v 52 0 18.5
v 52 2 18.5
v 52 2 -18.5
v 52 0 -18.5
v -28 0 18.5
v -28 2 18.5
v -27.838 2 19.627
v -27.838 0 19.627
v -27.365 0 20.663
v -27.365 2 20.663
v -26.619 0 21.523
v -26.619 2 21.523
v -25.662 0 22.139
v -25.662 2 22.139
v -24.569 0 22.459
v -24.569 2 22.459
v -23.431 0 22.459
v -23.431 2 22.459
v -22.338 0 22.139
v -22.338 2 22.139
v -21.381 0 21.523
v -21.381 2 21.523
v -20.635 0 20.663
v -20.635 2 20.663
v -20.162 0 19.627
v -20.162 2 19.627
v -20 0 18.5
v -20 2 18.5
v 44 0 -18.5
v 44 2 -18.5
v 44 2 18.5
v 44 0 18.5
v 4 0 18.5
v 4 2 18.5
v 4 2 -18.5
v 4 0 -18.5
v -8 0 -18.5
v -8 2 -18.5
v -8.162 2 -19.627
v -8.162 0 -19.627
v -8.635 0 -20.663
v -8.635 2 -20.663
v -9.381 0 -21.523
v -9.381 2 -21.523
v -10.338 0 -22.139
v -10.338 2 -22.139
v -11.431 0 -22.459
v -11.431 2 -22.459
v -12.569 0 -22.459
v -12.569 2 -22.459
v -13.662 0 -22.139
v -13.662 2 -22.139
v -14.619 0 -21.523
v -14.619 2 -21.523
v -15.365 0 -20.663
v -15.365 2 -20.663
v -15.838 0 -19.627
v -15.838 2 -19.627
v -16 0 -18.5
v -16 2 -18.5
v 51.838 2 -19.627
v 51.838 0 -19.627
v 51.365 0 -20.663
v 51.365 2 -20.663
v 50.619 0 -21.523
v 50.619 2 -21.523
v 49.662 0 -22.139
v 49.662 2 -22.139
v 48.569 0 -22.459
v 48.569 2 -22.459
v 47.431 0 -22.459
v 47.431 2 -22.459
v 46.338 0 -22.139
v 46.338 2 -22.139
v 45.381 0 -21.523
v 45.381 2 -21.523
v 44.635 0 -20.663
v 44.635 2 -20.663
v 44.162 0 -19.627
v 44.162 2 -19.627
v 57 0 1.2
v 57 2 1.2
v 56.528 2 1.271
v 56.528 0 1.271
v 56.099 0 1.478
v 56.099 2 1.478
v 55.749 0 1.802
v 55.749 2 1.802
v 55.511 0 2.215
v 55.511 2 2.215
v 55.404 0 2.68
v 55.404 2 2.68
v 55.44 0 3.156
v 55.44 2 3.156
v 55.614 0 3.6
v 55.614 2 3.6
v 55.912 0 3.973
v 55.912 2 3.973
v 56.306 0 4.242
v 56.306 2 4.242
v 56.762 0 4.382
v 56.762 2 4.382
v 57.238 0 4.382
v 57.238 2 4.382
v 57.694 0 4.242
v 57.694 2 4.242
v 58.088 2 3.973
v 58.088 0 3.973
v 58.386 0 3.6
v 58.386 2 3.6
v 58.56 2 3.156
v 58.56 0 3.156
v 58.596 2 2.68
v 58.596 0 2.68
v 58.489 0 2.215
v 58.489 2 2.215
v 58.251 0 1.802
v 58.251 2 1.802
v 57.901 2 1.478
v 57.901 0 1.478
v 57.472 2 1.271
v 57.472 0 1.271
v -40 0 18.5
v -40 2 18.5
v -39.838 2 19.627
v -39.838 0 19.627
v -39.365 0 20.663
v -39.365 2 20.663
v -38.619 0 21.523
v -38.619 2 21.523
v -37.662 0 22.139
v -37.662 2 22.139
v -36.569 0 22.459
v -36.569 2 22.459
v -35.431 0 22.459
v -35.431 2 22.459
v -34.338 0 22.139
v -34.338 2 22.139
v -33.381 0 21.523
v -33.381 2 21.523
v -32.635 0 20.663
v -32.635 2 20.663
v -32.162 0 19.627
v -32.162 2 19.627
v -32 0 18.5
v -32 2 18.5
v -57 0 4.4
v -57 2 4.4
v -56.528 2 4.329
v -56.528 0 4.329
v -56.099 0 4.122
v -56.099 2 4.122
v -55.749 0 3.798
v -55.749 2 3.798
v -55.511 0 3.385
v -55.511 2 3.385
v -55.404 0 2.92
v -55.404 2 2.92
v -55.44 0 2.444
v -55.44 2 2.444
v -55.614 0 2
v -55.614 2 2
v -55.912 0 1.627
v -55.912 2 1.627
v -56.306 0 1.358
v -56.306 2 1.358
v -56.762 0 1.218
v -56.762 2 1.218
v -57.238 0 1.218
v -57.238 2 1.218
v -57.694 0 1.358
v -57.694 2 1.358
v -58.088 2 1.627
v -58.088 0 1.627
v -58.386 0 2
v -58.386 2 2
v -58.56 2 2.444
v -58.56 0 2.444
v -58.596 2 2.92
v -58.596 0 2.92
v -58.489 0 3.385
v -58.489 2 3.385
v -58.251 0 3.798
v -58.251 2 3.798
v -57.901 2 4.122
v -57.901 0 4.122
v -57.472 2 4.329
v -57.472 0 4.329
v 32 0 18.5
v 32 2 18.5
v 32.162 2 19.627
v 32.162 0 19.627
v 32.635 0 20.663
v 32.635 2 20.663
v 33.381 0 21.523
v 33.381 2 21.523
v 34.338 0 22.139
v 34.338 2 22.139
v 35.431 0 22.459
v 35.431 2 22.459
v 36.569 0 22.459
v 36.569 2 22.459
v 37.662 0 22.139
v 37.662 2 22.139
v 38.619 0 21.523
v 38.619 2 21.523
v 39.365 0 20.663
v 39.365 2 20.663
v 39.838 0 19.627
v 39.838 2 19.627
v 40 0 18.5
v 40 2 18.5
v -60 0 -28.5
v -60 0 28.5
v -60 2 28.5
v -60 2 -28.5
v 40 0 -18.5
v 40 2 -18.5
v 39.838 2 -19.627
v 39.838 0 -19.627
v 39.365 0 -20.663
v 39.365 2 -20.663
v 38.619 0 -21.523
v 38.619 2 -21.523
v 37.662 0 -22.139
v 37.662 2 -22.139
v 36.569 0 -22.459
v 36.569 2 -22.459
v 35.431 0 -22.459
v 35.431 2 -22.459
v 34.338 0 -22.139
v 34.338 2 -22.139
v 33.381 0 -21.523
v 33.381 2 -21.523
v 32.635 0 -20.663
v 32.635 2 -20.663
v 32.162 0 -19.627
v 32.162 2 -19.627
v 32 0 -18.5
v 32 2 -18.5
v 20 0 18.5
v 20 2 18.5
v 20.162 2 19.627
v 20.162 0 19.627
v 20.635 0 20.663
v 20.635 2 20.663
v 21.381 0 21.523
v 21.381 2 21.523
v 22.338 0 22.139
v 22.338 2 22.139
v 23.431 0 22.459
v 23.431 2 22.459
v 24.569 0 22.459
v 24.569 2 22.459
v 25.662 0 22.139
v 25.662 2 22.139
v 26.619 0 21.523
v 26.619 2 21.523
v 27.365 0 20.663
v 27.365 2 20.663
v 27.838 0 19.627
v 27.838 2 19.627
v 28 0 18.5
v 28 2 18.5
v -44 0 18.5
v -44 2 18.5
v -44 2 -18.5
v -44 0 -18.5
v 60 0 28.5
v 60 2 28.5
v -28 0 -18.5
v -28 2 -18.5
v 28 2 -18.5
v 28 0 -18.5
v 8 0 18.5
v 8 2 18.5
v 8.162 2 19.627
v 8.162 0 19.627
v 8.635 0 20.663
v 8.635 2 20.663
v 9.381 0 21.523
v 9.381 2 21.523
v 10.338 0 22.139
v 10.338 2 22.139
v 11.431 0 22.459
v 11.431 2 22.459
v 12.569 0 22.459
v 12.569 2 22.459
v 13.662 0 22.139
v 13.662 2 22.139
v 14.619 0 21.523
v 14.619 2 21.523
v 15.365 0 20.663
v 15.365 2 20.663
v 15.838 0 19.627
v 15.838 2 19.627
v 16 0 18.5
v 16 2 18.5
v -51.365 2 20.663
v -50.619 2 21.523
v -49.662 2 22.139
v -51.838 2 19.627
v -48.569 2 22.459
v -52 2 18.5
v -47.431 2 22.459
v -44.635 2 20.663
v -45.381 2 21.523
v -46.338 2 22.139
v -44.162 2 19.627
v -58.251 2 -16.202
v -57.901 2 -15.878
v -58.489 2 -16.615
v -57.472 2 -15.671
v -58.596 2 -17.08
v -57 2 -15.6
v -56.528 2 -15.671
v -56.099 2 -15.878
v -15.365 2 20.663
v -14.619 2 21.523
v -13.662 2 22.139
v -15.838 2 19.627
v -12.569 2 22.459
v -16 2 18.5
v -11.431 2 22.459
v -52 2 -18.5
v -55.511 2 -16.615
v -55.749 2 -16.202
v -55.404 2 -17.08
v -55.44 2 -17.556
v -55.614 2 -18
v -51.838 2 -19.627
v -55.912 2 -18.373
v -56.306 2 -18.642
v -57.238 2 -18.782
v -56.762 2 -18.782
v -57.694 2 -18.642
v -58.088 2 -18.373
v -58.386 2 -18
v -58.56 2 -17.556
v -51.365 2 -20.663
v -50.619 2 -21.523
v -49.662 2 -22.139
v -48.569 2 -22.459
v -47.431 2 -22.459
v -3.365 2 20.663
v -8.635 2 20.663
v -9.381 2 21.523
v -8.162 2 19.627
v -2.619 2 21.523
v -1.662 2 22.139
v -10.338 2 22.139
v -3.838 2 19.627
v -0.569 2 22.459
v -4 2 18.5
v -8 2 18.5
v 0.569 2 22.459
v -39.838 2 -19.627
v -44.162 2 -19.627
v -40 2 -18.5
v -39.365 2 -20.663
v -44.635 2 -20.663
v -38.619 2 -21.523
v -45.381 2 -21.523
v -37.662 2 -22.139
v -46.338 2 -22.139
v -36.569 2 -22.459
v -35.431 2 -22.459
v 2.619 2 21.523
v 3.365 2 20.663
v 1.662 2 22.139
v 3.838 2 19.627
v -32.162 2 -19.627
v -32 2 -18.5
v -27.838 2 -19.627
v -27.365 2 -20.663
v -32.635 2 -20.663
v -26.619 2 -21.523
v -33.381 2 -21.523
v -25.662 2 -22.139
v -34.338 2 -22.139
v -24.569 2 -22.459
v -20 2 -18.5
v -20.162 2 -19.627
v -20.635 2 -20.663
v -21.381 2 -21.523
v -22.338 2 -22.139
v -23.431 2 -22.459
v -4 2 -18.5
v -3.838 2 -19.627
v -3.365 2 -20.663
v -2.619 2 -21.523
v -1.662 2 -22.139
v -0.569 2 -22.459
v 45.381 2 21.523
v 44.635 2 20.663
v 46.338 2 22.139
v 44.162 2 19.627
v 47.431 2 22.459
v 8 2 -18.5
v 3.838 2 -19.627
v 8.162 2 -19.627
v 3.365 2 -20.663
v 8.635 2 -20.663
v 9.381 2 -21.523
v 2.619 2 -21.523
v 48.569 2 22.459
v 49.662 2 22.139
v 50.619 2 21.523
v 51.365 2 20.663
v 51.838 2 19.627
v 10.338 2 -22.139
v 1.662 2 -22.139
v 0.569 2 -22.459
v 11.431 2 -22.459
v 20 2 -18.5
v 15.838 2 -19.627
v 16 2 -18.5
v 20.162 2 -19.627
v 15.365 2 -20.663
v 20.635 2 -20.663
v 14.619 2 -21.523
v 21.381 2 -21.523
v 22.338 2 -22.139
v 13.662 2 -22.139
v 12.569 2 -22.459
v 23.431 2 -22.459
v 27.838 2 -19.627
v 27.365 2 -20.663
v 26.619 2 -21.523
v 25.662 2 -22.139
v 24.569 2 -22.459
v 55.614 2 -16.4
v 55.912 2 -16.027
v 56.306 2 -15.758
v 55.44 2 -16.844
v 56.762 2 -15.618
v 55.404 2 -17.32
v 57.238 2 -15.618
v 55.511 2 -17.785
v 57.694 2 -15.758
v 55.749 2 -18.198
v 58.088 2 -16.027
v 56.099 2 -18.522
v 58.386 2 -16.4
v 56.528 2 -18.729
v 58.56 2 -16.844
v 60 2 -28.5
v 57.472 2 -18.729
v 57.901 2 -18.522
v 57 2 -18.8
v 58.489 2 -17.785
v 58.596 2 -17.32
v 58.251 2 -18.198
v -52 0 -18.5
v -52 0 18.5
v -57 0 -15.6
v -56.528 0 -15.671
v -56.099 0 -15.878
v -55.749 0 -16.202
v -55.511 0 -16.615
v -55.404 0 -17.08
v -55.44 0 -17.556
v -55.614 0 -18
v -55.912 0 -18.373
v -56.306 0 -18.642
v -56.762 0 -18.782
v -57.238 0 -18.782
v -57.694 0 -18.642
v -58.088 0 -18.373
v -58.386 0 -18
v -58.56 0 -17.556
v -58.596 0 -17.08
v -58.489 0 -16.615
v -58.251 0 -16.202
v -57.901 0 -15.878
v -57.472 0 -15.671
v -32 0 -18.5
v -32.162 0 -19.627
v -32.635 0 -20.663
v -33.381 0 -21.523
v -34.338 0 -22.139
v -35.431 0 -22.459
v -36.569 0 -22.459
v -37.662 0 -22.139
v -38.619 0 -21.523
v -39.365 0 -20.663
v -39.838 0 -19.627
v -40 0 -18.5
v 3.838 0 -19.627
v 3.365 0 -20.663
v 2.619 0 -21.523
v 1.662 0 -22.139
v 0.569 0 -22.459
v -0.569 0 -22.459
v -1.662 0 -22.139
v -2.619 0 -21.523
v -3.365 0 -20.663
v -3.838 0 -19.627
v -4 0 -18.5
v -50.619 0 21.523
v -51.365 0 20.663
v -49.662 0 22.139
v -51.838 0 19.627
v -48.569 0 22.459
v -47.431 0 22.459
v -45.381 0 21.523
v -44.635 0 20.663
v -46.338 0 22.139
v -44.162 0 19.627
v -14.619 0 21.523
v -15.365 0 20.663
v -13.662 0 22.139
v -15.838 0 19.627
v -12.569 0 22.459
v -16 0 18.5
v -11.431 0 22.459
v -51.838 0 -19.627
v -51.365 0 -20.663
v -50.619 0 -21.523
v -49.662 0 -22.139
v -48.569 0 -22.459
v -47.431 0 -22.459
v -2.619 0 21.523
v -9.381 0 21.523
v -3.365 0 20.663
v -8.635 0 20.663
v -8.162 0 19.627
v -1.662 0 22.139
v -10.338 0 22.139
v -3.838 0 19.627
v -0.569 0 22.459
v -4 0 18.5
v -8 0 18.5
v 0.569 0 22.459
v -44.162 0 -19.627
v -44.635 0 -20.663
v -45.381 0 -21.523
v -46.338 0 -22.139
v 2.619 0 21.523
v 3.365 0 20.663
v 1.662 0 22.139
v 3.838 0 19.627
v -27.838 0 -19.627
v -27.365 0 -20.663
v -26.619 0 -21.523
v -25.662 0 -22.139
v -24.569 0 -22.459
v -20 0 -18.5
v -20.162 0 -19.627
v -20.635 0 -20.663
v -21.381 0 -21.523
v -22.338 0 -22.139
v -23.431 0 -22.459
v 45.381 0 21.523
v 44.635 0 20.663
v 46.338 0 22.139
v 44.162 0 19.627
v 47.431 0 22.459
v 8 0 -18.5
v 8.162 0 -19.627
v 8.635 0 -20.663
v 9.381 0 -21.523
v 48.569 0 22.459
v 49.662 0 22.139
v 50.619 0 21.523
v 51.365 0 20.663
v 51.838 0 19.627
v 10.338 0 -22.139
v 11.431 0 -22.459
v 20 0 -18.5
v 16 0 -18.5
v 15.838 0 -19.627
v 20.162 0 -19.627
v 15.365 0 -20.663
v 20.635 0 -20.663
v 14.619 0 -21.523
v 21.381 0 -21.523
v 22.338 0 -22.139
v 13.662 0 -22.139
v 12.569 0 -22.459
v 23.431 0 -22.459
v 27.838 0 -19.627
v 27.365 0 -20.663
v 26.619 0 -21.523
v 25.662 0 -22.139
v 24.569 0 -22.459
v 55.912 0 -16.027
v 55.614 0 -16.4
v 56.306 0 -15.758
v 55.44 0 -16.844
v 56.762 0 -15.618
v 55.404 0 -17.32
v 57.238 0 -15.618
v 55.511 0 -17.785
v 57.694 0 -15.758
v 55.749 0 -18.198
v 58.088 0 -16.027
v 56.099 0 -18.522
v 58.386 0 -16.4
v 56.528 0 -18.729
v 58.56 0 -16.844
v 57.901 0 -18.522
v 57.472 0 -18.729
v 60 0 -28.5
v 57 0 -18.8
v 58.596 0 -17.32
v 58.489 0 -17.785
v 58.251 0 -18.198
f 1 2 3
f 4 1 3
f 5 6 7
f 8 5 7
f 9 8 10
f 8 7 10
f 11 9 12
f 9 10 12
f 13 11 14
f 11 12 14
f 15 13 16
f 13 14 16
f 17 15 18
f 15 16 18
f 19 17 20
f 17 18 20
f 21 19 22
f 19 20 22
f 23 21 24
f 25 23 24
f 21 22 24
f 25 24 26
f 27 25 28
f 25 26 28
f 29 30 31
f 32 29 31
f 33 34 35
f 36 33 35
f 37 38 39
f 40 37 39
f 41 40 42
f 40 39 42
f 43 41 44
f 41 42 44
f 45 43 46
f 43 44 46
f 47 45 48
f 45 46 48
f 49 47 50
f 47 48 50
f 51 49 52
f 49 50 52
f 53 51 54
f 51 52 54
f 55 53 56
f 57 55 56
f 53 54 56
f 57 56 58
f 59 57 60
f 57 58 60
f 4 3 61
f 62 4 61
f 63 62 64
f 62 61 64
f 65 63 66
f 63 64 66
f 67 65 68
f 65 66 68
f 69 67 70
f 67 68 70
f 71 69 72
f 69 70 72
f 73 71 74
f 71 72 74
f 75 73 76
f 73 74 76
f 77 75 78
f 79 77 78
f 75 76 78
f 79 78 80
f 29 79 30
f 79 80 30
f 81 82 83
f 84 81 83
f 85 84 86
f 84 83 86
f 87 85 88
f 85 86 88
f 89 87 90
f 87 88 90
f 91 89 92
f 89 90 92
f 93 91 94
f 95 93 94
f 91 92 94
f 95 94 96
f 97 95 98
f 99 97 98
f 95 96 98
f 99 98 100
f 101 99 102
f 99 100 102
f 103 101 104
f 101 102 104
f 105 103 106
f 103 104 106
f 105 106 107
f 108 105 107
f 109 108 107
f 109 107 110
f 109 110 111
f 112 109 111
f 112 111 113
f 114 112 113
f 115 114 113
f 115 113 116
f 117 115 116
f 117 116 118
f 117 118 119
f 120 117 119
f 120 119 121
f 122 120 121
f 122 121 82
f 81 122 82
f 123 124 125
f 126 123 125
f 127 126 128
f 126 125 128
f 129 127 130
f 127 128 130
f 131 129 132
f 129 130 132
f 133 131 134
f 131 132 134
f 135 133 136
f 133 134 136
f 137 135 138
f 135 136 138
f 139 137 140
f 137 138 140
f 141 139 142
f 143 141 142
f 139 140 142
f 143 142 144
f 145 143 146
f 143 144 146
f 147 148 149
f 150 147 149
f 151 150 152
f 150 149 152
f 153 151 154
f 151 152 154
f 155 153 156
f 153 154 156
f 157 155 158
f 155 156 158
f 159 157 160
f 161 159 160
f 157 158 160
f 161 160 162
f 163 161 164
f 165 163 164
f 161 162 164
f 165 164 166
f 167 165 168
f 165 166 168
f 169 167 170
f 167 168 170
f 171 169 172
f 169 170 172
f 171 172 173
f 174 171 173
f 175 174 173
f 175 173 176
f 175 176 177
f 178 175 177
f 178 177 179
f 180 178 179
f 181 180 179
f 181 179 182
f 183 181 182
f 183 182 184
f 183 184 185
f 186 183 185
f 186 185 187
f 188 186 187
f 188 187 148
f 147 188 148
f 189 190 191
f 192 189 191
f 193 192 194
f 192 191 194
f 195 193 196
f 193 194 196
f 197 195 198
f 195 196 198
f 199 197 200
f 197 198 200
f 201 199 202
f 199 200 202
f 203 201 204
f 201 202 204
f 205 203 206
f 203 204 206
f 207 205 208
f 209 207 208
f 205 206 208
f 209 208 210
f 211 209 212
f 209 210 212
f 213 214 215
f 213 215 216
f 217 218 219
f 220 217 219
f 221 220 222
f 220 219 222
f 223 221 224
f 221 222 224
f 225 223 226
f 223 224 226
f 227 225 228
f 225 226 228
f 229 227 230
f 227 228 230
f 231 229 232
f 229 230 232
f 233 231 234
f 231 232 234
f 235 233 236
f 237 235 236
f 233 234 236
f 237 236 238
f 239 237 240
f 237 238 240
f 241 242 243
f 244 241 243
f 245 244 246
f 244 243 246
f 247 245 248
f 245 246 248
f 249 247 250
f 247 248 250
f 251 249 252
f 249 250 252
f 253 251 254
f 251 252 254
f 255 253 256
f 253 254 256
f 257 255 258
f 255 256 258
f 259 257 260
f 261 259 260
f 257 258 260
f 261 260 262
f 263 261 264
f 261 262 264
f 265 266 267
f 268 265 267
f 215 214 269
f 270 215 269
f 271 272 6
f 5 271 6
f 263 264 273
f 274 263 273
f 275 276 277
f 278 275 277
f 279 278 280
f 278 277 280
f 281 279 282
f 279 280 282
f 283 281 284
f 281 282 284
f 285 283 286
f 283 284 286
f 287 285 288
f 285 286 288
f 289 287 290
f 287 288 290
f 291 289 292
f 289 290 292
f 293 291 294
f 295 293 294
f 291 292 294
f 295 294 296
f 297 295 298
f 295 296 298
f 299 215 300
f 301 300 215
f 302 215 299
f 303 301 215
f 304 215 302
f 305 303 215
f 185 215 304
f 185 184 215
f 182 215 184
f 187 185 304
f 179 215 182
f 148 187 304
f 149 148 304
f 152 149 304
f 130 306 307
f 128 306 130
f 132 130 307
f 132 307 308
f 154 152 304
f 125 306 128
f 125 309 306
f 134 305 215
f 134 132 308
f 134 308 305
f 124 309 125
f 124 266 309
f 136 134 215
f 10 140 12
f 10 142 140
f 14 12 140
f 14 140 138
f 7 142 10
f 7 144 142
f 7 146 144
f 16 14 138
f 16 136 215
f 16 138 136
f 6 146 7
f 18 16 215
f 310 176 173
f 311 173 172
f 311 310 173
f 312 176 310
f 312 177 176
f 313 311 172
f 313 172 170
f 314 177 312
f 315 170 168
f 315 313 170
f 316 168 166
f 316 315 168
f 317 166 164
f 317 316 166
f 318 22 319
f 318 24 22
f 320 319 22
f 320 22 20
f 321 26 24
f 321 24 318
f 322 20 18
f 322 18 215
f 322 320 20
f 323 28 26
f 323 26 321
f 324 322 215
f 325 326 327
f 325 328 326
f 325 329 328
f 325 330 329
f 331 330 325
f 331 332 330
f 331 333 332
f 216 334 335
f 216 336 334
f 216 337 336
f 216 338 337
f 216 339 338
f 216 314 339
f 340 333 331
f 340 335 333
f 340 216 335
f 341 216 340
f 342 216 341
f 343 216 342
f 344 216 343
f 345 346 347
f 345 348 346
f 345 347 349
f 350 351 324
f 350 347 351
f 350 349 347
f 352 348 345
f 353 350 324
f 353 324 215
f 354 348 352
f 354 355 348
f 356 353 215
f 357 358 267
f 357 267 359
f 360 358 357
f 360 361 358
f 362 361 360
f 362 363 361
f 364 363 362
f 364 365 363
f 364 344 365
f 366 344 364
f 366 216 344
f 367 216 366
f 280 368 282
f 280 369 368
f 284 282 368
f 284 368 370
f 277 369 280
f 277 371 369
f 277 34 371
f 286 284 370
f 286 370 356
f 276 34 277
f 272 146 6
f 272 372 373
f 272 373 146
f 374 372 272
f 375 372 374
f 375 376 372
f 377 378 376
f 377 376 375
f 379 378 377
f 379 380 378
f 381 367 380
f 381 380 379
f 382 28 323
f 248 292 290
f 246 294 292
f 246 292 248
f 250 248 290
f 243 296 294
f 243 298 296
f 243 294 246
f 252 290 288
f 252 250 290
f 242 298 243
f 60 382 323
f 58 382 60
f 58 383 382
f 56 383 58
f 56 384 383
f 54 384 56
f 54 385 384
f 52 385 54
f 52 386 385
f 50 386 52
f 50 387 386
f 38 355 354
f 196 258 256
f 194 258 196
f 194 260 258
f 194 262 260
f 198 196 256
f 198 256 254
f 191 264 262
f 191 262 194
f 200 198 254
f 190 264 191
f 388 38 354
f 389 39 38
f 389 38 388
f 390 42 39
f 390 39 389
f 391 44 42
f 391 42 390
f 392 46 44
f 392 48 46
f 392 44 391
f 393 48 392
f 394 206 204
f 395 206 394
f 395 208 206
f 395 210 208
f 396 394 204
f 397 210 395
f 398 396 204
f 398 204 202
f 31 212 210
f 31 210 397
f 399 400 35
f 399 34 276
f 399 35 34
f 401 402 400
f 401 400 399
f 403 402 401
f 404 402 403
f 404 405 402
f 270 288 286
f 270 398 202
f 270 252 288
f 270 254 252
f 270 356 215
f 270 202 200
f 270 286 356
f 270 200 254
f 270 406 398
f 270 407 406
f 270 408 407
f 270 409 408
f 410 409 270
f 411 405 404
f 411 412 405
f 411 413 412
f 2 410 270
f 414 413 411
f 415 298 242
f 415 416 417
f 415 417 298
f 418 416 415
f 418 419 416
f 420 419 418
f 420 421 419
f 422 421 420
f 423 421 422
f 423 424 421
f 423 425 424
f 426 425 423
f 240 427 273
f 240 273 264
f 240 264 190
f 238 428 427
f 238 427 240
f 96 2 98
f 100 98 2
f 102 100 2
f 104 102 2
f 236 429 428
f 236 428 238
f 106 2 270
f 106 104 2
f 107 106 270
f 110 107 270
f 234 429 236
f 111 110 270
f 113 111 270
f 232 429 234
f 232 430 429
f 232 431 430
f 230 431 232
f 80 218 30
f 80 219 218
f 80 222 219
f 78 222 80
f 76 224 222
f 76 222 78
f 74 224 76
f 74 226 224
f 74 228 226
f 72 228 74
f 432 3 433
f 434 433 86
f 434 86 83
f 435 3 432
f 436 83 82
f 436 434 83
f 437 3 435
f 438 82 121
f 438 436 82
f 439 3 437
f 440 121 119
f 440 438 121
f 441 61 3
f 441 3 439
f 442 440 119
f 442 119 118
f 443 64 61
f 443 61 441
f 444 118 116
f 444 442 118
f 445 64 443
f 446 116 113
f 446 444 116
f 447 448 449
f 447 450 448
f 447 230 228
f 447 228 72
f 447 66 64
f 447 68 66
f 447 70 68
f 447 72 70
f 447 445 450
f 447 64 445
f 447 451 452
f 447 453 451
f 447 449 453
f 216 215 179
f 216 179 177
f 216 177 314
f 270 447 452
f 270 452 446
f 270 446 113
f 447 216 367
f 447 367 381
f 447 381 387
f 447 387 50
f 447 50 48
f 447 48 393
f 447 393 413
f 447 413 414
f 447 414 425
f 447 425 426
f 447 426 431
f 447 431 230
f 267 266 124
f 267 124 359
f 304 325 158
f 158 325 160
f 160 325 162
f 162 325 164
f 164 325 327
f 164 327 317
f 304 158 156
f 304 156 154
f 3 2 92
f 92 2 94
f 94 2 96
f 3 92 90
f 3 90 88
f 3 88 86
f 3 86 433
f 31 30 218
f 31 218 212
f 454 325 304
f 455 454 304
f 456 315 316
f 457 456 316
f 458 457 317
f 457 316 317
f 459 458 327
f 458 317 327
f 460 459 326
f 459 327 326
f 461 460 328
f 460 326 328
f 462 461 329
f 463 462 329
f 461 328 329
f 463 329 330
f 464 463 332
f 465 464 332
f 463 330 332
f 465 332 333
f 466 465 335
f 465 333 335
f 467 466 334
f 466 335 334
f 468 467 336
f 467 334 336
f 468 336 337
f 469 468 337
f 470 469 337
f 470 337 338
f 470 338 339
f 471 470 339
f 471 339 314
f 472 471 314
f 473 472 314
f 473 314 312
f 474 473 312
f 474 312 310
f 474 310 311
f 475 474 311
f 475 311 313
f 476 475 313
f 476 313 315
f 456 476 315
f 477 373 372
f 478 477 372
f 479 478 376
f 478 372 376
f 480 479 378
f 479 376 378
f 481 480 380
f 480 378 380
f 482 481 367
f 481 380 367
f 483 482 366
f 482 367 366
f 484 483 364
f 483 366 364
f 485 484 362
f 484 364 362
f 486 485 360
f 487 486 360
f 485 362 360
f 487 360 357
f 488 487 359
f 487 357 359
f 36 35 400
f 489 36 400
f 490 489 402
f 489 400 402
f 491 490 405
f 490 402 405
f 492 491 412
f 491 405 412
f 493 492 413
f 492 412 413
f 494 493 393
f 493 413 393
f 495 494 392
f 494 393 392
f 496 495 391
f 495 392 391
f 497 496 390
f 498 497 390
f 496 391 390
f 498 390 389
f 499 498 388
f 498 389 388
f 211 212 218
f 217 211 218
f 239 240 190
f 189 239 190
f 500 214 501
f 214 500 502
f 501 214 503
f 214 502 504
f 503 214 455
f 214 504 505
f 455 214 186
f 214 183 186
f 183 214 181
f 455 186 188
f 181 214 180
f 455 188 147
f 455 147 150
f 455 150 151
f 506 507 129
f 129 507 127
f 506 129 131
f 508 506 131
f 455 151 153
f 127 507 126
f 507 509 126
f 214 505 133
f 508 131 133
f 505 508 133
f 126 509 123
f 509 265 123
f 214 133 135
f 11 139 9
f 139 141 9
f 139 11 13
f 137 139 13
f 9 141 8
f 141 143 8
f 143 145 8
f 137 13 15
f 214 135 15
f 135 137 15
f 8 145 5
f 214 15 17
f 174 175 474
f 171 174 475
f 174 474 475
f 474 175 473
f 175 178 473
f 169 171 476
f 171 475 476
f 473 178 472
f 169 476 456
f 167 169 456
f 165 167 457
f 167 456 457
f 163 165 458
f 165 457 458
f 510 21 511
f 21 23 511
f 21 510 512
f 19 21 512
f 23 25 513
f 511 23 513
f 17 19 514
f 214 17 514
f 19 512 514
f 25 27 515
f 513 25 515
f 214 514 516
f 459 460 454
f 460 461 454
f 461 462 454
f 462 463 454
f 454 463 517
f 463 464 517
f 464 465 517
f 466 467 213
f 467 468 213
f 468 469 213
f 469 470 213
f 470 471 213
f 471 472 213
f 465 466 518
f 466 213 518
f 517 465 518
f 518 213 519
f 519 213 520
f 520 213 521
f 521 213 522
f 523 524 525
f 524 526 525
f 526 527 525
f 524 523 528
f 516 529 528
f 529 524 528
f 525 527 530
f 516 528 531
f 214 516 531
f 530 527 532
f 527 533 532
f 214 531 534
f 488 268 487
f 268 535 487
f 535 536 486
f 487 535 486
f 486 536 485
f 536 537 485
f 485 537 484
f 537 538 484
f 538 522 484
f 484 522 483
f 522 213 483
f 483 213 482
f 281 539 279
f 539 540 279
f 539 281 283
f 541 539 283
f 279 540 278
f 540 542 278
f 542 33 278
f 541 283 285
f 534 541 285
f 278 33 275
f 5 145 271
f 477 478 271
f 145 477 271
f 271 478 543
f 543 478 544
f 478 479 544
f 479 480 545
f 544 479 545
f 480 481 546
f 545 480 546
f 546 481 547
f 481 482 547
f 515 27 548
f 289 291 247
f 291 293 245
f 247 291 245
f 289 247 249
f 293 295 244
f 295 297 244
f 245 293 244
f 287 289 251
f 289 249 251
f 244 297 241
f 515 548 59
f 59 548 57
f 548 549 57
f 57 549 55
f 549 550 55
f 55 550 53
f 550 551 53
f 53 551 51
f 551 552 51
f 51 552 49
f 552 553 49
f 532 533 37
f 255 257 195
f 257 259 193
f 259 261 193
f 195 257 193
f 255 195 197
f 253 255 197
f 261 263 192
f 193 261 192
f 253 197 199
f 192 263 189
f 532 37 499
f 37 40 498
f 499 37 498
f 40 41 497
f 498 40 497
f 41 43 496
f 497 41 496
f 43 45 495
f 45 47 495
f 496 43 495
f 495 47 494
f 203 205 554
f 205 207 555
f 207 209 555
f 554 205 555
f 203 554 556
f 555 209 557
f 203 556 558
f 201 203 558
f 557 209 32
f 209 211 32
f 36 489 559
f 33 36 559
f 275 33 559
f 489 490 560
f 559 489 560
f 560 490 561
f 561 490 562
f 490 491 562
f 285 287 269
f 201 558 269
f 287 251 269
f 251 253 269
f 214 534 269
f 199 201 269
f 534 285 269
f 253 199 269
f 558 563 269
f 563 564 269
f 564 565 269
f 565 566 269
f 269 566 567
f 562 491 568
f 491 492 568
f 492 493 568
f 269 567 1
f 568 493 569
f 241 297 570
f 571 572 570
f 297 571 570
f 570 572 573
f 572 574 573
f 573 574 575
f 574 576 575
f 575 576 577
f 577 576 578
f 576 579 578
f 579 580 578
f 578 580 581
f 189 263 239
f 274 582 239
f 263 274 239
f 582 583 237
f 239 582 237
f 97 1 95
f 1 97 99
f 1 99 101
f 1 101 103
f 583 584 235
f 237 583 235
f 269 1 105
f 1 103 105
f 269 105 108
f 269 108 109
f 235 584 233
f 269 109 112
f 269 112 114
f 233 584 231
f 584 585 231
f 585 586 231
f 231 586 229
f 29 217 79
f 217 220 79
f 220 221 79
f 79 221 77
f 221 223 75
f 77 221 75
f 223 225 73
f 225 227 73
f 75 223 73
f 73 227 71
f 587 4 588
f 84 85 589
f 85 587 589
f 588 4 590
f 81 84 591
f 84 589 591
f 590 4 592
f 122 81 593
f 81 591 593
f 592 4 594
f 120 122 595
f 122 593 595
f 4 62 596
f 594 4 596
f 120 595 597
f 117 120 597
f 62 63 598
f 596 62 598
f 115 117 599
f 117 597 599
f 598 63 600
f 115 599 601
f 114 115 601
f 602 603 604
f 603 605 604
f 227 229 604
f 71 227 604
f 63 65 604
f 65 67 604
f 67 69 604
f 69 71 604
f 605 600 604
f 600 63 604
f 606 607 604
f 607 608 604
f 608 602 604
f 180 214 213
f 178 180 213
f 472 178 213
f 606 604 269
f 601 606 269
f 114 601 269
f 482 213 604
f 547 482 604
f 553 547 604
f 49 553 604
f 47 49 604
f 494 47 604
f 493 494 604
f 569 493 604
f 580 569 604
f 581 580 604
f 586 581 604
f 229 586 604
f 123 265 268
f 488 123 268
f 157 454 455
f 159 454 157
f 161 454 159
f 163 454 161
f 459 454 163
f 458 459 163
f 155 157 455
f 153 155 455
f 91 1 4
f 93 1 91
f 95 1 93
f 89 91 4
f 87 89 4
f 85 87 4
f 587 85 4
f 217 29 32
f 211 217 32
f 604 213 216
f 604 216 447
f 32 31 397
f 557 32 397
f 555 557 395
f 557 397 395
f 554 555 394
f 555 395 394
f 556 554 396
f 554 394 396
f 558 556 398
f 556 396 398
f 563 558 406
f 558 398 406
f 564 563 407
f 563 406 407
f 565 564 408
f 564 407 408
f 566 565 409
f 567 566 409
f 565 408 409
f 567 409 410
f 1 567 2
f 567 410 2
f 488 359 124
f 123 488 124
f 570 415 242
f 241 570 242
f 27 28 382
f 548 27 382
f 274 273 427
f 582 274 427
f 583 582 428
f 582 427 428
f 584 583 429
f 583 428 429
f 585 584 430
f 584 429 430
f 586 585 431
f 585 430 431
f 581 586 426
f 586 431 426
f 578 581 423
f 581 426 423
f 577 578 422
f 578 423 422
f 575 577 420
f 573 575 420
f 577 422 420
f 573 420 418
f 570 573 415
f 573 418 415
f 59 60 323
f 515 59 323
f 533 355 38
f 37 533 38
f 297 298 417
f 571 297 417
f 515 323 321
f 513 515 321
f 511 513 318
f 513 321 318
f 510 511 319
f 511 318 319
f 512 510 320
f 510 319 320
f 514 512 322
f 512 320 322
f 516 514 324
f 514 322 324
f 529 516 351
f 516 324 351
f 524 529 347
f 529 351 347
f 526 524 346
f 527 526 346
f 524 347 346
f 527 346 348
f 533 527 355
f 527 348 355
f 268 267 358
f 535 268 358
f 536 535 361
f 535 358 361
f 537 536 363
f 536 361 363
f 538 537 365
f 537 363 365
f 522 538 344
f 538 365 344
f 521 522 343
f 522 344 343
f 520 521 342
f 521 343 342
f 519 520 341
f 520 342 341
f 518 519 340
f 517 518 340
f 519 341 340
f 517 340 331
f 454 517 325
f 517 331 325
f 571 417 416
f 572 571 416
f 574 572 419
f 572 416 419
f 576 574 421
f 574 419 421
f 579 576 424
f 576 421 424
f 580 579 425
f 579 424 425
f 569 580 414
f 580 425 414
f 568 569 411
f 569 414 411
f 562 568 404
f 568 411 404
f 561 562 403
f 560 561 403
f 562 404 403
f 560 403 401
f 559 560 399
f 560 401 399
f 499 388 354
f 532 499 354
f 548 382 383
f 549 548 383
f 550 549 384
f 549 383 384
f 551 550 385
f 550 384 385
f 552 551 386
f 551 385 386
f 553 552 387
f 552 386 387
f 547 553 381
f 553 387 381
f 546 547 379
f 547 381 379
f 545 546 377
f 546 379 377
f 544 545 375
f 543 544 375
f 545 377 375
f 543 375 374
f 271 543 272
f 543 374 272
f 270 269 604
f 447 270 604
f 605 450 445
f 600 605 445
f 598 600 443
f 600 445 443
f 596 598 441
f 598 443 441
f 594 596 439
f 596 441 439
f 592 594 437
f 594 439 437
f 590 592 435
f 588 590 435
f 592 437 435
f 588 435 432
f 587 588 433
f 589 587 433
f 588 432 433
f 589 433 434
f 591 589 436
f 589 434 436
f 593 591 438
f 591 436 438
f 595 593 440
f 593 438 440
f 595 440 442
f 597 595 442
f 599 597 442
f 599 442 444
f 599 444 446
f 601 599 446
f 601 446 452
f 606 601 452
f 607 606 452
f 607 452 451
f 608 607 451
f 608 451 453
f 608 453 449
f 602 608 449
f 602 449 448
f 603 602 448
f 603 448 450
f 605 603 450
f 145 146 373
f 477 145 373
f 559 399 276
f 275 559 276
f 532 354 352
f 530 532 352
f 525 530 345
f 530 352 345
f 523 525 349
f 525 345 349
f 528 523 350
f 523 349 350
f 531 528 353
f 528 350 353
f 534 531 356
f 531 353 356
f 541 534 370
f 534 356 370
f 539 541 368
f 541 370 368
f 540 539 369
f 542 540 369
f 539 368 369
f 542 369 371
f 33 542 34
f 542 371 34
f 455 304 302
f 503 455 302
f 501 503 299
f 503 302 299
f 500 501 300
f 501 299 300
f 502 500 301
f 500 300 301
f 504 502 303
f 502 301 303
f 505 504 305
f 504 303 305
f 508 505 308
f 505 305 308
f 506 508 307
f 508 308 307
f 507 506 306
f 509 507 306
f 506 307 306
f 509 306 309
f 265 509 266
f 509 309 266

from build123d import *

# Parameters (mm, degrees)
SKETCH_1_W                 = 120
SKETCH_1_H                 = 57
EXTRUDE_1_DEPTH            = 2
SKETCH_2_R                 = 1.6
CUT_EXTRUDE_1_DEPTH        = 67.454871906
CUT_EXTRUDE_2_DEPTH        = 67.454871906
PATTERN_LINEAR_1_COUNT     = 5
PATTERN_LINEAR_1_PITCH     = 12
PATTERN_LINEAR_1_COL_COUNT = 5
PATTERN_LINEAR_1_COL_PITCH = 12


with BuildPart() as part:
    # 草图1 → 凸台-拉伸1 (new body)
    with BuildSketch(Plane(origin=(0, 0, 0), x_dir=(1, 0, 0), z_dir=(0, 1, 0))):
        Rectangle(SKETCH_1_W, SKETCH_1_H)
    extrude(amount=EXTRUDE_1_DEPTH)

    # 草图2 → 切除-拉伸1 (cut, through all)
    with BuildSketch(Plane(origin=(0, 2, 0), x_dir=(1, 0, 0), z_dir=(0, 1, 0))):
        with Locations(Location((-57, 17.2, 0), (0, 0, 270))):
            Circle(SKETCH_2_R)
        with Locations(Location((-57, -2.8, 0), (0, 0, 270))):
            Circle(SKETCH_2_R)
        with Locations(Location((57, -2.8, 0), (0, 0, 90))):
            Circle(SKETCH_2_R)
        with Locations(Location((57, 17.2, 0), (0, 0, 90))):
            Circle(SKETCH_2_R)
    extrude(amount=-CUT_EXTRUDE_1_DEPTH, mode=Mode.SUBTRACT)

    # 草图3 → 切除-拉伸2 (cut, through all)
    with BuildSketch(Plane(origin=(0, 2, 0), x_dir=(1, 0, 0), z_dir=(0, 1, 0))):
        with BuildLine():
            ThreePointArc((-4, -18.5), (0, -14.5), (4, -18.5))
            Line((4, -18.5), (4, 18.5))
            ThreePointArc((4, 18.5), (0, 14.5), (-4, 18.5))
            Line((-4, 18.5), (-4, -18.5))
        make_face()
        with BuildLine():
            ThreePointArc((-4, 18.5), (0, 14.5), (4, 18.5))
            Line((4, 18.5), (-4, 18.5))
        make_face()
        with BuildLine():
            Line((-4, 18.5), (4, 18.5))
            ThreePointArc((4, 18.5), (0, 22.5), (-4, 18.5))
        make_face()
        with BuildLine():
            ThreePointArc((-4, -18.5), (0, -22.5), (4, -18.5))
            Line((4, -18.5), (-4, -18.5))
        make_face()
        with BuildLine():
            Line((-4, -18.5), (4, -18.5))
            ThreePointArc((4, -18.5), (0, -14.5), (-4, -18.5))
        make_face()
    cut_extrude_2 = extrude(amount=-CUT_EXTRUDE_2_DEPTH, mode=Mode.SUBTRACT)

    # 阵列(线性)1: 切除-拉伸2 ×5
    with Locations(*[(i * PATTERN_LINEAR_1_PITCH, 0, 0) for i in range(1, PATTERN_LINEAR_1_COUNT)]):
        add(cut_extrude_2, mode=Mode.SUBTRACT)

    # 阵列(线性)1 col: 切除-拉伸2 ×5
    with Locations(*[(-i * PATTERN_LINEAR_1_COL_PITCH, 0, 0) for i in range(1, PATTERN_LINEAR_1_COL_COUNT)]):
        add(cut_extrude_2, mode=Mode.SUBTRACT)


solid = part.part
